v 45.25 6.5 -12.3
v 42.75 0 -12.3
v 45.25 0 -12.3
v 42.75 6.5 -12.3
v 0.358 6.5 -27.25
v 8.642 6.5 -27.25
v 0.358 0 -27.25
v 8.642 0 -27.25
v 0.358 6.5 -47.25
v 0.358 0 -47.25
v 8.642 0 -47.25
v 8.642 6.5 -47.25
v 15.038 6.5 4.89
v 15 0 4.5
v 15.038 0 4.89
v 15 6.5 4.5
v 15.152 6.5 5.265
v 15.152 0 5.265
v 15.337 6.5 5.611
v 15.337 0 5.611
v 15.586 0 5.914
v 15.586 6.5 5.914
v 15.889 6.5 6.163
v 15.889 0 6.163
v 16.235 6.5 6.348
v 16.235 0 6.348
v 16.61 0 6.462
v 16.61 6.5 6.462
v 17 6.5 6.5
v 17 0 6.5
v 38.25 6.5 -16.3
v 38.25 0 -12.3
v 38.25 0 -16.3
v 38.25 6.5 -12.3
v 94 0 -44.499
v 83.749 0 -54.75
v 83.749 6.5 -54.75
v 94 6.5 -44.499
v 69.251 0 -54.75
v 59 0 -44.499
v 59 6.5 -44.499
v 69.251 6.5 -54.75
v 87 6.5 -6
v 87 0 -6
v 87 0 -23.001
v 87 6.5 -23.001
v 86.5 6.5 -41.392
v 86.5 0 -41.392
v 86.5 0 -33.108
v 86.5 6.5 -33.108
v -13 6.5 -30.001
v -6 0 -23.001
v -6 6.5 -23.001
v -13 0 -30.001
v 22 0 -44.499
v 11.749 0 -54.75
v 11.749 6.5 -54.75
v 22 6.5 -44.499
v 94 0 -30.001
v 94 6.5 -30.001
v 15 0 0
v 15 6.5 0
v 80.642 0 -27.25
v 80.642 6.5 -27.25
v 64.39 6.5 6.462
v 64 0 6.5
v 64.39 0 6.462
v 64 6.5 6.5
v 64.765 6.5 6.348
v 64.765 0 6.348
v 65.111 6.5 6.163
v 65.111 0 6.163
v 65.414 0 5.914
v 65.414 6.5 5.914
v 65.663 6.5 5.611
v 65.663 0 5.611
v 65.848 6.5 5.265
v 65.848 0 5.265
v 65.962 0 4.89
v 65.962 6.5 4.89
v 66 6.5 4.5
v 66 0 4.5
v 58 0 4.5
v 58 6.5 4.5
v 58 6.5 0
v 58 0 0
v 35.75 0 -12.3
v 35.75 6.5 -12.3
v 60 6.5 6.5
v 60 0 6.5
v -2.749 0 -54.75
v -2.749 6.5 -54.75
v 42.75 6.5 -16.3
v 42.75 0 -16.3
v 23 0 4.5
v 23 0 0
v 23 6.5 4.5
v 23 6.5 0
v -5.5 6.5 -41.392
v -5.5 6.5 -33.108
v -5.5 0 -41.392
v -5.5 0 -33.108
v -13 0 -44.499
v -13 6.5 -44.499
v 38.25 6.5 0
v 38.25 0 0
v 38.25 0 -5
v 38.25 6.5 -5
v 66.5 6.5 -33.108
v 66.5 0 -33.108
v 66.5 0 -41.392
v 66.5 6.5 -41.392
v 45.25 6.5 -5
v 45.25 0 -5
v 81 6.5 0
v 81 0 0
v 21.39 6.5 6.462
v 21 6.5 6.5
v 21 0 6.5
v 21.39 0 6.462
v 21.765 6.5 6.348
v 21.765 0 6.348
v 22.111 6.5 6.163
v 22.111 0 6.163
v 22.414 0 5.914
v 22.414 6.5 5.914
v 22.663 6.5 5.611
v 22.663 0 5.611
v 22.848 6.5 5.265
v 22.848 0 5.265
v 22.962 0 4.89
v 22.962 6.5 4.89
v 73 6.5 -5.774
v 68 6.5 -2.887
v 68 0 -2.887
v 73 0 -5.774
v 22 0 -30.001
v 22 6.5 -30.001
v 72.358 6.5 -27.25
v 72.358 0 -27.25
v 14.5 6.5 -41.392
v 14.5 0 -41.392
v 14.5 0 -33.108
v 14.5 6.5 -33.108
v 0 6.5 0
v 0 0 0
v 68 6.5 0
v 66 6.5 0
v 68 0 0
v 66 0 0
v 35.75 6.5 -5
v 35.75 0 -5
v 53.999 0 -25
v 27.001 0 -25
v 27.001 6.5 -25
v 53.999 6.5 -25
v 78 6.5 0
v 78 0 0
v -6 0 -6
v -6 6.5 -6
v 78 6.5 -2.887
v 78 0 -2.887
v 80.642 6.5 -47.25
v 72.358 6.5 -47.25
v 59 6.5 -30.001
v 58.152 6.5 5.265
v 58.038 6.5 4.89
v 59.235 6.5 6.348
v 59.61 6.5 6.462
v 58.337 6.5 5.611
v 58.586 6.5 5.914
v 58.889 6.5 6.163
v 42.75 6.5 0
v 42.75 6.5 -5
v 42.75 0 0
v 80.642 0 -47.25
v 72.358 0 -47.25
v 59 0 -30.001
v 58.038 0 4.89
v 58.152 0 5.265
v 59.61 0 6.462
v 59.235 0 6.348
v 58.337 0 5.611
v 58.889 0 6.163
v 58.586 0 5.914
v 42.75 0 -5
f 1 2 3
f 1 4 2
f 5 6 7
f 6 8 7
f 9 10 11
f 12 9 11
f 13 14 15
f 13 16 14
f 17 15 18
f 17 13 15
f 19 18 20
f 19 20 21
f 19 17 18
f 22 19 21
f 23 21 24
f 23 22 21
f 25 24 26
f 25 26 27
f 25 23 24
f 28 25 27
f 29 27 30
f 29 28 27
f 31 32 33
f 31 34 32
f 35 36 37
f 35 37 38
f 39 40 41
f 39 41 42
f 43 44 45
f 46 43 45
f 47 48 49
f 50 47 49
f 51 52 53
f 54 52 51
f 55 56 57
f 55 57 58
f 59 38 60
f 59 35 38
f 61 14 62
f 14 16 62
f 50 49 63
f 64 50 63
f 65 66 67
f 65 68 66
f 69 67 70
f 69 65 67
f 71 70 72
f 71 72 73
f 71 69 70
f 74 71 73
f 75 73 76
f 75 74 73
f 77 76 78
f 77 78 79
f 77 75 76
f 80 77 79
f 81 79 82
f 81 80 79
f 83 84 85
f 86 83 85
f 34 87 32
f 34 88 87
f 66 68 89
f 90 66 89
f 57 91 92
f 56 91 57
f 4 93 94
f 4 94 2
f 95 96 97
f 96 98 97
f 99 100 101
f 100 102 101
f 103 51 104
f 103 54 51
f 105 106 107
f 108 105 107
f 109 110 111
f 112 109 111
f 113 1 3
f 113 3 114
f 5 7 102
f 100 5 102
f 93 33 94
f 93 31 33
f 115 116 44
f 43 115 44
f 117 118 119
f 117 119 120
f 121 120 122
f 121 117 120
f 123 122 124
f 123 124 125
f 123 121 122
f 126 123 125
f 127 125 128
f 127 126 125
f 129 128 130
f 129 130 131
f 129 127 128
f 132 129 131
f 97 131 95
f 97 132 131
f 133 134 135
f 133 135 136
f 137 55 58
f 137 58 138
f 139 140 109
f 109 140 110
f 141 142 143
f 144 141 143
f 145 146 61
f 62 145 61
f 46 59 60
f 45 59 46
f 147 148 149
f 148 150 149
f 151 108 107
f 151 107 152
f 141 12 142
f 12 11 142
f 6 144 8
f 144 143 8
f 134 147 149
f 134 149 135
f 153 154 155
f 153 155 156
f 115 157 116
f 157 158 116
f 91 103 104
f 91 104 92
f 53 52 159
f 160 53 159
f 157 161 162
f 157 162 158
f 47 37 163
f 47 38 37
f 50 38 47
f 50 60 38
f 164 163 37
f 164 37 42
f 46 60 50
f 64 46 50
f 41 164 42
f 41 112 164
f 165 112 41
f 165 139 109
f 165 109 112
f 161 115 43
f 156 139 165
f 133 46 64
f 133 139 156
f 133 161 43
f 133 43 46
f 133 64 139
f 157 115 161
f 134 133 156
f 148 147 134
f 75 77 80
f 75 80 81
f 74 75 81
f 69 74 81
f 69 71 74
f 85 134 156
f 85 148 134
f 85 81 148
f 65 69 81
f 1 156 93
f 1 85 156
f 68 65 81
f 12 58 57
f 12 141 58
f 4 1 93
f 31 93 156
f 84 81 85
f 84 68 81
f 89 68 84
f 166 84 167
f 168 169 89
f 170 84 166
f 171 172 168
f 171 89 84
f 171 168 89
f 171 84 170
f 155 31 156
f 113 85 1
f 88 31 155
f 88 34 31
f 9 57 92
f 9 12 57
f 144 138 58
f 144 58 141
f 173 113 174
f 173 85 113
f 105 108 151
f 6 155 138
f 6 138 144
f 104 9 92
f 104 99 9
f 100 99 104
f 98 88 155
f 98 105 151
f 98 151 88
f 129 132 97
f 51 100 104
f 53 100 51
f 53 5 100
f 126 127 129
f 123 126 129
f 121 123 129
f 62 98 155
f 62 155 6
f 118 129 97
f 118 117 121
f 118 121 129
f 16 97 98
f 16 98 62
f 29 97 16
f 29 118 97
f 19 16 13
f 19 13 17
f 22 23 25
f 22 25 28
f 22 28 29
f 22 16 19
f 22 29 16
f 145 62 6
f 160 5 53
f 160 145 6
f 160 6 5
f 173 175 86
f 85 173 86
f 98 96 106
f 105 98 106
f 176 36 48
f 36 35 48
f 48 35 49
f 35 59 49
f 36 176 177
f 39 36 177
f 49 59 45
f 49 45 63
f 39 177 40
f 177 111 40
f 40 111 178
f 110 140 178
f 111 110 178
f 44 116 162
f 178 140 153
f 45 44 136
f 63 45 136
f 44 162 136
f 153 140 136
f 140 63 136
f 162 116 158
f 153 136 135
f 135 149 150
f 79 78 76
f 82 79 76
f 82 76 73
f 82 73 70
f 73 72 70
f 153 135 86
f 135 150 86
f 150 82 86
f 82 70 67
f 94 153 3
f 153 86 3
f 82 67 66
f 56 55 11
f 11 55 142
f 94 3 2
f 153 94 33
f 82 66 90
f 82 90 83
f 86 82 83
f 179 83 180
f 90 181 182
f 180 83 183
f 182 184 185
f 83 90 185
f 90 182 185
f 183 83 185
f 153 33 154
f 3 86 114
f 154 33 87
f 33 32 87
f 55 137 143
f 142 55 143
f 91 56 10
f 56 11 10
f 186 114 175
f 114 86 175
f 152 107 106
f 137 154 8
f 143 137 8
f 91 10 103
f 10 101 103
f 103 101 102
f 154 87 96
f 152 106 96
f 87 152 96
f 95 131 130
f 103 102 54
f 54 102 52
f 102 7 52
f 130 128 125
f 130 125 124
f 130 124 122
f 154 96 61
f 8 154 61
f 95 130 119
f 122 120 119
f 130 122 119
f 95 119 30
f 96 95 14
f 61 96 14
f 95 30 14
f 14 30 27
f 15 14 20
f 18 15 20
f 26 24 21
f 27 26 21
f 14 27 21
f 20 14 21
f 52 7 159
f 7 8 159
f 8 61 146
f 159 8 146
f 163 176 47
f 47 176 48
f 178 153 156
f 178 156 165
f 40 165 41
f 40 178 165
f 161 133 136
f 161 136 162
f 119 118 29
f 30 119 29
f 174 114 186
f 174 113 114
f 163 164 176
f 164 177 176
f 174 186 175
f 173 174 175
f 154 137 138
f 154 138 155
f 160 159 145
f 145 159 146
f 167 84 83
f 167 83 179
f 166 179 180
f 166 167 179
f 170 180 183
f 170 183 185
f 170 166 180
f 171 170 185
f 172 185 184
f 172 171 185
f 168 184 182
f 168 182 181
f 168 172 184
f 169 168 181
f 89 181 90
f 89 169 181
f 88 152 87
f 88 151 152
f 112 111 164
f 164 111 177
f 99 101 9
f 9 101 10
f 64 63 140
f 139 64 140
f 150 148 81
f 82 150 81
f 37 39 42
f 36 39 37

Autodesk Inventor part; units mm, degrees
ref_plane "YZ Plane" through (0, 0, 0) normal (1, 0, 0) x (0, 1, 0)
ref_plane "XZ Plane" through (0, 0, 0) normal (0, 1, 0) x (-1, 0, 0)
ref_plane "XY Plane" through (0, 0, 0) normal (0, 0, 1) x (1, 0, 0)
sketch "Sketch1" plane through (0, 0, 0) normal (0, 1, 0) x (-1, 0, 0)
  line L0 (0, 0) -> (-81, 0)
  line L1 (6, -23.0013) -> (13, -30.0013)
  line L2 (13, -30.0013) -> (13, -44.4987)
  line L3 (13, -44.4987) -> (2.7487, -54.75)
  line L4 (2.7487, -54.75) -> (-11.7487, -54.75)
  line L5 (-11.7487, -54.75) -> (-22, -44.4987)
  line L6 (-22, -44.4987) -> (-22, -30.0013)
  line L7 (-59, -30.0013) -> (-59, -44.4987)
  line L8 (-59, -44.4987) -> (-69.2513, -54.75)
  line L9 (-69.2513, -54.75) -> (-83.7487, -54.75)
  line L10 (-83.7487, -54.75) -> (-94, -44.4987)
  line L11 (-94, -44.4987) -> (-94, -30.0013)
  line L12 (-94, -30.0013) -> (-87, -23.0013)
  line L13 (-4.5, -37.25) -> (-76.5, -37.25) construction
  line L14 (-8.6421, -27.25) -> (-0.3579, -27.25)
  line L15 (-0.3579, -27.25) -> (5.5, -33.1079)
  line L16 (5.5, -33.1079) -> (5.5, -41.3921)
  line L17 (5.5, -41.3921) -> (-0.3579, -47.25)
  line L18 (-0.3579, -47.25) -> (-8.6421, -47.25)
  line L19 (-8.6421, -47.25) -> (-14.5, -41.3921)
  line L20 (-14.5, -41.3921) -> (-14.5, -33.1079)
  line L21 (-14.5, -33.1079) -> (-8.6421, -27.25)
  line L22 (-80.6421, -27.25) -> (-72.3579, -27.25)
  line L23 (-72.3579, -27.25) -> (-66.5, -33.1079)
  line L24 (-66.5, -33.1079) -> (-66.5, -41.3921)
  line L25 (-66.5, -41.3921) -> (-72.3579, -47.25)
  line L26 (-72.3579, -47.25) -> (-80.6421, -47.25)
  line L27 (-80.6421, -47.25) -> (-86.5, -41.3921)
  line L28 (-86.5, -41.3921) -> (-86.5, -33.1079)
  line L29 (-86.5, -33.1079) -> (-80.6421, -27.25)
  line L30 (6, -23.0013) -> (6, -6)
  line L31 (6, -6) -> (0, 0)
  line L32 (-81, 0) -> (-87, -6)
  line L33 (-87, -6) -> (-87, -23.0013)
  line L34 (-22, -30.0013) -> (-27.0013, -25)
  line L35 (-27.0013, -25) -> (-53.9987, -25)
  line L36 (-53.9987, -25) -> (-59, -30.0013)
  point P0 (-40.5, -37.25)
  point P1 (-40.5, 0)
  dimension "d0" = 81
  dimension "d1" = 37.25
  dimension "d2" = 72
  dimension "d3" = 20
  dimension "d4" = 20
  dimension "d5" = 45
  dimension "d6" = 6
  dimension "d7" = 35
  dimension "d8" = 35
  dimension "d17" = 7
  dimension "d20" = 45
  dimension "d21" = 25
extrude "Extrusion1" add sketch "Sketch1" along normal blind 6.5
sketch "Sketch2" plane through (0, 6.5, 0) normal (0, 1, 0) x (1, 0, 0)
  line L0 (0, 0) -> (81, 0) projected
  line L1 (38.25, 16.3) -> (42.75, 16.3)
  line L2 (42.75, 0) -> (38.25, 0)
  line L3 (45.25, 12.3) -> (45.25, 5)
  line L4 (35.75, 5) -> (35.75, 12.3)
  line L5 (38.25, 0) -> (38.25, 5)
  line L6 (38.25, 12.3) -> (38.25, 16.3)
  line L7 (42.75, 16.3) -> (42.75, 12.3)
  line L8 (42.75, 5) -> (42.75, 0)
  line L9 (35.75, 12.3) -> (38.25, 12.3)
  line L10 (42.75, 12.3) -> (45.25, 12.3)
  line L11 (45.25, 5) -> (42.75, 5)
  line L12 (38.25, 5) -> (35.75, 5)
  point P0 (40.5, 0)
  dimension "d24" = 4.5
  dimension "d25" = 4
  dimension "d26" = 5
  dimension "d27" = 7.3
  dimension "d28" = 2.5
extrude "Extrusion2" cut sketch "Sketch2" against normal through all
sketch "Sketch3" plane through (0, 6.5, 0) normal (0, 1, 0) x (1, 0, 0)
  line L0 (42.75, 0) -> (81, 0) projected
  line L1 (0, 0) -> (38.25, 0) projected
  line L2 (38.25, 16.3) -> (42.75, 16.3) projected
  line L3 (15, 0) -> (23, 0)
  line L4 (23, 0) -> (23, -4.5)
  line L5 (21, -6.5) -> (17, -6.5)
  line L6 (15, -4.5) -> (15, 0)
  line L7 (58, 0) -> (66, 0)
  line L8 (66, 0) -> (66, -4.5)
  line L9 (64, -6.5) -> (60, -6.5)
  line L10 (58, -4.5) -> (58, 0)
  arc A0 (15, -4.5) -> (17, -6.5) centre (17, -4.5) ccw
  arc A1 (21, -6.5) -> (23, -4.5) centre (21, -4.5) ccw
  arc A2 (58, -4.5) -> (60, -6.5) centre (60, -4.5) ccw
  arc A3 (64, -6.5) -> (66, -4.5) centre (64, -4.5) ccw
  point P0 (40.5, 16.3)
  dimension "d31" = 2
  dimension "d32" = 8
  dimension "d33" = 8
  dimension "d34" = 6.5
  dimension "d35" = 35
  dimension "d36" = 17.5
extrude "Extrusion3" add sketch "Sketch3" against normal blind 6.5
sketch "Sketch4" plane through (0, 6.5, 0) normal (0, 1, 0) x (1, 0, 0)
  line L0 (66, -4.5) -> (66, 0) projected
  line L1 (66, 0) -> (81, 0) projected
  line L2 (73, 5.7735) -> (78, 2.8868)
  line L3 (78, 2.8868) -> (78, 0)
  line L4 (68, 0) -> (68, 2.8868)
  line L5 (68, 2.8868) -> (73, 5.7735)
  line L6 (78, 0) -> (68, 0)
  point P0 (73, 0)
  dimension "d39" = 10
  dimension "d40" = 2
extrude "Extrusion4" cut sketch "Sketch4" against normal through all
equation "\"d33\" = d32"
equation "\"d36\" = 0.5 * d35"
properties part number "filament_guide" material "Plywood, Finish"
